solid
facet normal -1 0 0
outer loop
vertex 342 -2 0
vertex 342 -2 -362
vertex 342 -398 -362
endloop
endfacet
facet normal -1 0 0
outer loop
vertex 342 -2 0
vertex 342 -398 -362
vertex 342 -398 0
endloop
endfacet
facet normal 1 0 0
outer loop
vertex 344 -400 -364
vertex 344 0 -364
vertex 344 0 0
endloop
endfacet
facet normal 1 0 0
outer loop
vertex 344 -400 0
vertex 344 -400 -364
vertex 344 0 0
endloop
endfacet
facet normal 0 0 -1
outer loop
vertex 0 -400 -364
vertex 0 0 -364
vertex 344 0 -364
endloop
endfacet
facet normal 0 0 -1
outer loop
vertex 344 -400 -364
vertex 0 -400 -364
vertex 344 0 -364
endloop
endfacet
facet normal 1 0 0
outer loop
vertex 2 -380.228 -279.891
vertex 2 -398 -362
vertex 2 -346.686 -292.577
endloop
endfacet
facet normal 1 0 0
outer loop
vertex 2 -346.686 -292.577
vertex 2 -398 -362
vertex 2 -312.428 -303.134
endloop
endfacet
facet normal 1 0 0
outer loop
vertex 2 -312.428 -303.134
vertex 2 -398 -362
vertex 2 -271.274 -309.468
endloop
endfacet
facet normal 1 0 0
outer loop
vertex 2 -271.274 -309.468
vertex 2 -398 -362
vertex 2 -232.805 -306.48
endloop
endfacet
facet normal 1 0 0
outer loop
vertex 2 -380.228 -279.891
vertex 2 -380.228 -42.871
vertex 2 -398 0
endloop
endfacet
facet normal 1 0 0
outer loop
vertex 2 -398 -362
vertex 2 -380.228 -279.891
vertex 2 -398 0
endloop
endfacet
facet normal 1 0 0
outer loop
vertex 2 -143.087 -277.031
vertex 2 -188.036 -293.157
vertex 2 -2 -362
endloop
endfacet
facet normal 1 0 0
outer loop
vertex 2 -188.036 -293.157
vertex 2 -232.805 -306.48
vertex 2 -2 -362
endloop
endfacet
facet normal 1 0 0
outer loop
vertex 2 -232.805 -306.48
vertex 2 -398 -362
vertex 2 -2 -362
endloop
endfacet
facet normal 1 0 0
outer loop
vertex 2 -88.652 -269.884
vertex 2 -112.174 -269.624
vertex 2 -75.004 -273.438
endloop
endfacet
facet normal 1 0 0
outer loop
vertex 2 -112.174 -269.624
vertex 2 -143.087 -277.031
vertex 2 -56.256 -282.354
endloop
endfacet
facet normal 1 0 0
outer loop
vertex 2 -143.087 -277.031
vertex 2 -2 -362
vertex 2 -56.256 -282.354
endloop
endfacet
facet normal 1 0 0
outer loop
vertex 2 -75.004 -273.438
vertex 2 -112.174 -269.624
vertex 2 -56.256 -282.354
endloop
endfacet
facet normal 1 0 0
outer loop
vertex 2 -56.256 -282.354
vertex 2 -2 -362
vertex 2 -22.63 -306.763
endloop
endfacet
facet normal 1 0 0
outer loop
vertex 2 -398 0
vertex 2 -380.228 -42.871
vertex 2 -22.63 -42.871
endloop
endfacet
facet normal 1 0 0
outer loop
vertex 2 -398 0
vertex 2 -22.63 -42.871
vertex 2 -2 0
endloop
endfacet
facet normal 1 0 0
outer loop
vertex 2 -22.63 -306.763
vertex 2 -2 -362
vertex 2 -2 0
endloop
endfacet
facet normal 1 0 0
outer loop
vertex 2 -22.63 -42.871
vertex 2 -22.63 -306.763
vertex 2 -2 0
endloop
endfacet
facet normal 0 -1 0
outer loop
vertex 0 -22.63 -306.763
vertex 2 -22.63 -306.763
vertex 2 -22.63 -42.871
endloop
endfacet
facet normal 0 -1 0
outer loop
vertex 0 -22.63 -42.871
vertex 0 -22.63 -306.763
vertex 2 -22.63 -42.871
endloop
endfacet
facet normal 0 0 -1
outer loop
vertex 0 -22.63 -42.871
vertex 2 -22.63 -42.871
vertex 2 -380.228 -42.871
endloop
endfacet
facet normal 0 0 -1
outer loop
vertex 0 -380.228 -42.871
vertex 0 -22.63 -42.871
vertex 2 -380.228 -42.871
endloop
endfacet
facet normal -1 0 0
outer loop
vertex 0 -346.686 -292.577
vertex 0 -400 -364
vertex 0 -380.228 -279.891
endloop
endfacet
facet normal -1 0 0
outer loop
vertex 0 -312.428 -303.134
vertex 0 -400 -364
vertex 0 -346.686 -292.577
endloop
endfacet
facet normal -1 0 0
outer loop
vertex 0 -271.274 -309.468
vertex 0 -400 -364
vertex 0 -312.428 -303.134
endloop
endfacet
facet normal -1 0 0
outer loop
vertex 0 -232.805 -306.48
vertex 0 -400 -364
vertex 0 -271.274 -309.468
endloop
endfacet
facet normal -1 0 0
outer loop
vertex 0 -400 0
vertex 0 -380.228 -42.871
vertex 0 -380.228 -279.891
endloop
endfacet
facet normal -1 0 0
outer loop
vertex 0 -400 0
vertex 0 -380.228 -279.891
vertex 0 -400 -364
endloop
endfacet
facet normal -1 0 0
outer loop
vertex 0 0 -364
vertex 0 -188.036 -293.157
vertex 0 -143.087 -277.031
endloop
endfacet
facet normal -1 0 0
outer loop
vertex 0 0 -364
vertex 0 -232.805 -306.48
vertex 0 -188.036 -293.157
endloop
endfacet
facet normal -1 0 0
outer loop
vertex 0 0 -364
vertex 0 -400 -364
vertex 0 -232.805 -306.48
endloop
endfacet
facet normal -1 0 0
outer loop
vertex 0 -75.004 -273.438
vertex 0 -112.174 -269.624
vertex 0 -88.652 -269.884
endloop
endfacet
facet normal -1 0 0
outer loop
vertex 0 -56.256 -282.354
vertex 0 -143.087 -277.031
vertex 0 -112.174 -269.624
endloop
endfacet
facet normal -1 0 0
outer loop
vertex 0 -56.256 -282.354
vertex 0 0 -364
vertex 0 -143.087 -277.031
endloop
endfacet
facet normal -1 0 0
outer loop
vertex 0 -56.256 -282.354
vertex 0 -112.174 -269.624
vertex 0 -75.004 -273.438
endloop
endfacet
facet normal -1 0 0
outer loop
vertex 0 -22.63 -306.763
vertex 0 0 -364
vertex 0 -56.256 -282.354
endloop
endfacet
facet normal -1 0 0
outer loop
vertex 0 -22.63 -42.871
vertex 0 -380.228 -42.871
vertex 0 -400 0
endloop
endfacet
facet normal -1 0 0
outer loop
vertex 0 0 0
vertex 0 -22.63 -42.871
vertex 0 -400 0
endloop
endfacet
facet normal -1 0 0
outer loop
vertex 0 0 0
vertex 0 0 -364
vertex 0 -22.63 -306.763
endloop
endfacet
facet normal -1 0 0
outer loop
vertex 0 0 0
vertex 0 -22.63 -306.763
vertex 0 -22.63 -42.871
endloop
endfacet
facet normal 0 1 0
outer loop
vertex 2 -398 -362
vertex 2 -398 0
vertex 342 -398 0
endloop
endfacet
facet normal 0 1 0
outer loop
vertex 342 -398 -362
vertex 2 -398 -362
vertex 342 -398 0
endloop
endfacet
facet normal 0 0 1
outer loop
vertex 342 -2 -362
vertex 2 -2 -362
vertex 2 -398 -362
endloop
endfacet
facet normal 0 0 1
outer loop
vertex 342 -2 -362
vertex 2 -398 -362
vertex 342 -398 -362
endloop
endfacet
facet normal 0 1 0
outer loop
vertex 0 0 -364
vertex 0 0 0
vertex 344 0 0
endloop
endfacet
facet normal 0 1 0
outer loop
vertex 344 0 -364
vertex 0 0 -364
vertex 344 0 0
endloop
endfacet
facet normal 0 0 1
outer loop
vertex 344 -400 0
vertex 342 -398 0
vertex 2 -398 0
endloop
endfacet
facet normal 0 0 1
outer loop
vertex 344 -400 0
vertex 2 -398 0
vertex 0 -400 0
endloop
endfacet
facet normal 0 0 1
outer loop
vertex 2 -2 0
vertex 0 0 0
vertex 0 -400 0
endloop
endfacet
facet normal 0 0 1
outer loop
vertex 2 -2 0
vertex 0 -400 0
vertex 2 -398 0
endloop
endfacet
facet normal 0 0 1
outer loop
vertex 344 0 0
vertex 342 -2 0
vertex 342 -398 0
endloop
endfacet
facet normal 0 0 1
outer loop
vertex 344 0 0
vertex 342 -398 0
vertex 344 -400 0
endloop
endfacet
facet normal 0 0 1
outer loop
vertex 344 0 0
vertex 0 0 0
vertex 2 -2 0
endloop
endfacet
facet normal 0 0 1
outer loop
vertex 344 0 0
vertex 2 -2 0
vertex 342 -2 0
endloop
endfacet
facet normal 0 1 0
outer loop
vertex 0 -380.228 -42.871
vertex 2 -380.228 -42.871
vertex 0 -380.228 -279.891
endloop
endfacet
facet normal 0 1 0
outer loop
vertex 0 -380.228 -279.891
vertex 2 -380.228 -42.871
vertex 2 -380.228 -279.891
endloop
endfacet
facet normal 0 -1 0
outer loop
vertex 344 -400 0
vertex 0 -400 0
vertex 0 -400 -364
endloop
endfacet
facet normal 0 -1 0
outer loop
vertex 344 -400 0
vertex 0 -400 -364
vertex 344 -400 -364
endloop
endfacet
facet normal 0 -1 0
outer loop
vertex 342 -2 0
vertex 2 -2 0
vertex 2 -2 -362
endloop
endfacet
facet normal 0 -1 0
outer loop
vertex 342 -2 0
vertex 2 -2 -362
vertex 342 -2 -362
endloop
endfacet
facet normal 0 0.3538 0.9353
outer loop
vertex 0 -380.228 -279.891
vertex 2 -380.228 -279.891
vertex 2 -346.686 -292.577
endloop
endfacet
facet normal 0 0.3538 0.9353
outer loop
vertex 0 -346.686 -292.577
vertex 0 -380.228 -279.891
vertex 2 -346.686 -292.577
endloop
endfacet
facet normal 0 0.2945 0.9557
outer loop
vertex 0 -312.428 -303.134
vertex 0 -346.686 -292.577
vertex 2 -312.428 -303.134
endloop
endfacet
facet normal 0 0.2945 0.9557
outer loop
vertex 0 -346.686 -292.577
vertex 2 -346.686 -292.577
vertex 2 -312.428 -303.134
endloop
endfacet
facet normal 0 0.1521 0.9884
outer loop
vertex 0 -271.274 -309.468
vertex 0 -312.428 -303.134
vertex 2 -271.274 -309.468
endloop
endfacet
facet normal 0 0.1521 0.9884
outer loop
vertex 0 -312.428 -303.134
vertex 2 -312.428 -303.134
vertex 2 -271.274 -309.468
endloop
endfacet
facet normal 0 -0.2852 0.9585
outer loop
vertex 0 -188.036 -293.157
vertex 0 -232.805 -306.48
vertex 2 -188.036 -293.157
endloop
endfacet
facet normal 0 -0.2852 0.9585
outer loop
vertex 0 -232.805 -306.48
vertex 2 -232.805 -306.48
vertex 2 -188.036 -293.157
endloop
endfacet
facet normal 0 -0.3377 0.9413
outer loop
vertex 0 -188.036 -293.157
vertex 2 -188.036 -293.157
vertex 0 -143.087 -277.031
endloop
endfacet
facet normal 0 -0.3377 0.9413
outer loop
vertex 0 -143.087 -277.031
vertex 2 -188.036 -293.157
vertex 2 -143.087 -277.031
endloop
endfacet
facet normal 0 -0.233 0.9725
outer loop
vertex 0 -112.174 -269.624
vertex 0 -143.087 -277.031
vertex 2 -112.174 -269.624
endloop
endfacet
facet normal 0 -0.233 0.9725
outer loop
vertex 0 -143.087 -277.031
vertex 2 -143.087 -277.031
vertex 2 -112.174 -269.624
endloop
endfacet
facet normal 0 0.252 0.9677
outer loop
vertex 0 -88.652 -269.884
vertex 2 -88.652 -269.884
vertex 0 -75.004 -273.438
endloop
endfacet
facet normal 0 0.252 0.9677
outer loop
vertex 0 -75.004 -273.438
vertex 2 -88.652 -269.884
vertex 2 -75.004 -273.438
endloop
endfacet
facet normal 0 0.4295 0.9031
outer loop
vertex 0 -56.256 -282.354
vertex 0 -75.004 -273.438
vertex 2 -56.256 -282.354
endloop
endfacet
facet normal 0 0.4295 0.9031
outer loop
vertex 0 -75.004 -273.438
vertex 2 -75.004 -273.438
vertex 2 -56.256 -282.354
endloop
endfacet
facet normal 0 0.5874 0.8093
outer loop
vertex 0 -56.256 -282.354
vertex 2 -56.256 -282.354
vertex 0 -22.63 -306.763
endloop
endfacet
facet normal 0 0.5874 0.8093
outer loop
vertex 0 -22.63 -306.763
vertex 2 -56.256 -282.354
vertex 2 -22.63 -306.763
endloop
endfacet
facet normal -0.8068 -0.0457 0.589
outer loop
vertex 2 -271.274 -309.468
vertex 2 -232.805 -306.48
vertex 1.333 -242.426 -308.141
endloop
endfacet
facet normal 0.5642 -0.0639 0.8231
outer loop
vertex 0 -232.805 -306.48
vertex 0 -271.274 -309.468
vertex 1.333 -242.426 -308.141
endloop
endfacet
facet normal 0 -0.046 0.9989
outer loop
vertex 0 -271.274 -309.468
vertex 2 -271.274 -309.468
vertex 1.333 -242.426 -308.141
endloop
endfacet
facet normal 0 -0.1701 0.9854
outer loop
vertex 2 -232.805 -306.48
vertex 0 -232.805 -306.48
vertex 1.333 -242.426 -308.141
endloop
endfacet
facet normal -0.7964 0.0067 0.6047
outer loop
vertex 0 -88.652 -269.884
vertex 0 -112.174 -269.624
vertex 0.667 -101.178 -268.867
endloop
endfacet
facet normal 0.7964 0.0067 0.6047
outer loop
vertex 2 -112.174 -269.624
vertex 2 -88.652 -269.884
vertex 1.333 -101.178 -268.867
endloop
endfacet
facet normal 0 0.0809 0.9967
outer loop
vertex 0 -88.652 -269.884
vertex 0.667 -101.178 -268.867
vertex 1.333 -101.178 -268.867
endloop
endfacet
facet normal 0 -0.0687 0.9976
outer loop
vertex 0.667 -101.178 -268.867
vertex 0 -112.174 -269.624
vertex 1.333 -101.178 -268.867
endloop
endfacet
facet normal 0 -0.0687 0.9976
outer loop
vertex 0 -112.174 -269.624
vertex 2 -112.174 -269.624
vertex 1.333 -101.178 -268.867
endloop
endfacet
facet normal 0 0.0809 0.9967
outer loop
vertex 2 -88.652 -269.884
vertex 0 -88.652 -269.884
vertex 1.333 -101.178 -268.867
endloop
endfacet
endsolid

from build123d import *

# Parameters (mm, degrees)
F0_W     = 344
F0_H     = 364
F1_DEPTH = 400
F2_T     = -2
F4_START = -25
F4_DEPTH = 319.001


with BuildPart() as f1:
    # F0 (on Front) → F1 (new body)
    with BuildSketch(Plane.XZ):
        with Locations((172, -182)):
            Rectangle(F0_W, F0_H)
    extrude(amount=F1_DEPTH)

    # F2
    f2_openings = [f1.faces().sort_by_distance(p)[0] for p in [
        (172, -200, 0),
    ]]
    offset(amount=F2_T, openings=f2_openings)

    # F3 (on face) → F4 (cut)
    with BuildSketch(Plane.YZ.offset(344).offset(F4_START)):
        with BuildLine():
            Line((-380.2282512188, -42.8705103695), (-380.2282512188, -279.8911333084))
            add(Edge.make_bspline(
                [(-380.2282512188, -279.8911333084), (-335.3109516688, -297.4034551854), (-244.5381641795, -332.7938791003), (-101.0842446911, -244.1373138208), (-46.4290637673, -287.7654343562), (-22.6302593946, -306.7626655102)],
                knots=[0, 0, 0, 0, 0.3560906868, 0.7196190458, 1, 1, 1, 1], degree=3))
            Line((-22.6302593946, -306.7626655102), (-22.6302593946, -42.8705103695))
            Line((-22.6302593946, -42.8705103695), (-380.2282512188, -42.8705103695))
        make_face()
    extrude(amount=-F4_DEPTH, mode=Mode.SUBTRACT)


solid = f1.part
